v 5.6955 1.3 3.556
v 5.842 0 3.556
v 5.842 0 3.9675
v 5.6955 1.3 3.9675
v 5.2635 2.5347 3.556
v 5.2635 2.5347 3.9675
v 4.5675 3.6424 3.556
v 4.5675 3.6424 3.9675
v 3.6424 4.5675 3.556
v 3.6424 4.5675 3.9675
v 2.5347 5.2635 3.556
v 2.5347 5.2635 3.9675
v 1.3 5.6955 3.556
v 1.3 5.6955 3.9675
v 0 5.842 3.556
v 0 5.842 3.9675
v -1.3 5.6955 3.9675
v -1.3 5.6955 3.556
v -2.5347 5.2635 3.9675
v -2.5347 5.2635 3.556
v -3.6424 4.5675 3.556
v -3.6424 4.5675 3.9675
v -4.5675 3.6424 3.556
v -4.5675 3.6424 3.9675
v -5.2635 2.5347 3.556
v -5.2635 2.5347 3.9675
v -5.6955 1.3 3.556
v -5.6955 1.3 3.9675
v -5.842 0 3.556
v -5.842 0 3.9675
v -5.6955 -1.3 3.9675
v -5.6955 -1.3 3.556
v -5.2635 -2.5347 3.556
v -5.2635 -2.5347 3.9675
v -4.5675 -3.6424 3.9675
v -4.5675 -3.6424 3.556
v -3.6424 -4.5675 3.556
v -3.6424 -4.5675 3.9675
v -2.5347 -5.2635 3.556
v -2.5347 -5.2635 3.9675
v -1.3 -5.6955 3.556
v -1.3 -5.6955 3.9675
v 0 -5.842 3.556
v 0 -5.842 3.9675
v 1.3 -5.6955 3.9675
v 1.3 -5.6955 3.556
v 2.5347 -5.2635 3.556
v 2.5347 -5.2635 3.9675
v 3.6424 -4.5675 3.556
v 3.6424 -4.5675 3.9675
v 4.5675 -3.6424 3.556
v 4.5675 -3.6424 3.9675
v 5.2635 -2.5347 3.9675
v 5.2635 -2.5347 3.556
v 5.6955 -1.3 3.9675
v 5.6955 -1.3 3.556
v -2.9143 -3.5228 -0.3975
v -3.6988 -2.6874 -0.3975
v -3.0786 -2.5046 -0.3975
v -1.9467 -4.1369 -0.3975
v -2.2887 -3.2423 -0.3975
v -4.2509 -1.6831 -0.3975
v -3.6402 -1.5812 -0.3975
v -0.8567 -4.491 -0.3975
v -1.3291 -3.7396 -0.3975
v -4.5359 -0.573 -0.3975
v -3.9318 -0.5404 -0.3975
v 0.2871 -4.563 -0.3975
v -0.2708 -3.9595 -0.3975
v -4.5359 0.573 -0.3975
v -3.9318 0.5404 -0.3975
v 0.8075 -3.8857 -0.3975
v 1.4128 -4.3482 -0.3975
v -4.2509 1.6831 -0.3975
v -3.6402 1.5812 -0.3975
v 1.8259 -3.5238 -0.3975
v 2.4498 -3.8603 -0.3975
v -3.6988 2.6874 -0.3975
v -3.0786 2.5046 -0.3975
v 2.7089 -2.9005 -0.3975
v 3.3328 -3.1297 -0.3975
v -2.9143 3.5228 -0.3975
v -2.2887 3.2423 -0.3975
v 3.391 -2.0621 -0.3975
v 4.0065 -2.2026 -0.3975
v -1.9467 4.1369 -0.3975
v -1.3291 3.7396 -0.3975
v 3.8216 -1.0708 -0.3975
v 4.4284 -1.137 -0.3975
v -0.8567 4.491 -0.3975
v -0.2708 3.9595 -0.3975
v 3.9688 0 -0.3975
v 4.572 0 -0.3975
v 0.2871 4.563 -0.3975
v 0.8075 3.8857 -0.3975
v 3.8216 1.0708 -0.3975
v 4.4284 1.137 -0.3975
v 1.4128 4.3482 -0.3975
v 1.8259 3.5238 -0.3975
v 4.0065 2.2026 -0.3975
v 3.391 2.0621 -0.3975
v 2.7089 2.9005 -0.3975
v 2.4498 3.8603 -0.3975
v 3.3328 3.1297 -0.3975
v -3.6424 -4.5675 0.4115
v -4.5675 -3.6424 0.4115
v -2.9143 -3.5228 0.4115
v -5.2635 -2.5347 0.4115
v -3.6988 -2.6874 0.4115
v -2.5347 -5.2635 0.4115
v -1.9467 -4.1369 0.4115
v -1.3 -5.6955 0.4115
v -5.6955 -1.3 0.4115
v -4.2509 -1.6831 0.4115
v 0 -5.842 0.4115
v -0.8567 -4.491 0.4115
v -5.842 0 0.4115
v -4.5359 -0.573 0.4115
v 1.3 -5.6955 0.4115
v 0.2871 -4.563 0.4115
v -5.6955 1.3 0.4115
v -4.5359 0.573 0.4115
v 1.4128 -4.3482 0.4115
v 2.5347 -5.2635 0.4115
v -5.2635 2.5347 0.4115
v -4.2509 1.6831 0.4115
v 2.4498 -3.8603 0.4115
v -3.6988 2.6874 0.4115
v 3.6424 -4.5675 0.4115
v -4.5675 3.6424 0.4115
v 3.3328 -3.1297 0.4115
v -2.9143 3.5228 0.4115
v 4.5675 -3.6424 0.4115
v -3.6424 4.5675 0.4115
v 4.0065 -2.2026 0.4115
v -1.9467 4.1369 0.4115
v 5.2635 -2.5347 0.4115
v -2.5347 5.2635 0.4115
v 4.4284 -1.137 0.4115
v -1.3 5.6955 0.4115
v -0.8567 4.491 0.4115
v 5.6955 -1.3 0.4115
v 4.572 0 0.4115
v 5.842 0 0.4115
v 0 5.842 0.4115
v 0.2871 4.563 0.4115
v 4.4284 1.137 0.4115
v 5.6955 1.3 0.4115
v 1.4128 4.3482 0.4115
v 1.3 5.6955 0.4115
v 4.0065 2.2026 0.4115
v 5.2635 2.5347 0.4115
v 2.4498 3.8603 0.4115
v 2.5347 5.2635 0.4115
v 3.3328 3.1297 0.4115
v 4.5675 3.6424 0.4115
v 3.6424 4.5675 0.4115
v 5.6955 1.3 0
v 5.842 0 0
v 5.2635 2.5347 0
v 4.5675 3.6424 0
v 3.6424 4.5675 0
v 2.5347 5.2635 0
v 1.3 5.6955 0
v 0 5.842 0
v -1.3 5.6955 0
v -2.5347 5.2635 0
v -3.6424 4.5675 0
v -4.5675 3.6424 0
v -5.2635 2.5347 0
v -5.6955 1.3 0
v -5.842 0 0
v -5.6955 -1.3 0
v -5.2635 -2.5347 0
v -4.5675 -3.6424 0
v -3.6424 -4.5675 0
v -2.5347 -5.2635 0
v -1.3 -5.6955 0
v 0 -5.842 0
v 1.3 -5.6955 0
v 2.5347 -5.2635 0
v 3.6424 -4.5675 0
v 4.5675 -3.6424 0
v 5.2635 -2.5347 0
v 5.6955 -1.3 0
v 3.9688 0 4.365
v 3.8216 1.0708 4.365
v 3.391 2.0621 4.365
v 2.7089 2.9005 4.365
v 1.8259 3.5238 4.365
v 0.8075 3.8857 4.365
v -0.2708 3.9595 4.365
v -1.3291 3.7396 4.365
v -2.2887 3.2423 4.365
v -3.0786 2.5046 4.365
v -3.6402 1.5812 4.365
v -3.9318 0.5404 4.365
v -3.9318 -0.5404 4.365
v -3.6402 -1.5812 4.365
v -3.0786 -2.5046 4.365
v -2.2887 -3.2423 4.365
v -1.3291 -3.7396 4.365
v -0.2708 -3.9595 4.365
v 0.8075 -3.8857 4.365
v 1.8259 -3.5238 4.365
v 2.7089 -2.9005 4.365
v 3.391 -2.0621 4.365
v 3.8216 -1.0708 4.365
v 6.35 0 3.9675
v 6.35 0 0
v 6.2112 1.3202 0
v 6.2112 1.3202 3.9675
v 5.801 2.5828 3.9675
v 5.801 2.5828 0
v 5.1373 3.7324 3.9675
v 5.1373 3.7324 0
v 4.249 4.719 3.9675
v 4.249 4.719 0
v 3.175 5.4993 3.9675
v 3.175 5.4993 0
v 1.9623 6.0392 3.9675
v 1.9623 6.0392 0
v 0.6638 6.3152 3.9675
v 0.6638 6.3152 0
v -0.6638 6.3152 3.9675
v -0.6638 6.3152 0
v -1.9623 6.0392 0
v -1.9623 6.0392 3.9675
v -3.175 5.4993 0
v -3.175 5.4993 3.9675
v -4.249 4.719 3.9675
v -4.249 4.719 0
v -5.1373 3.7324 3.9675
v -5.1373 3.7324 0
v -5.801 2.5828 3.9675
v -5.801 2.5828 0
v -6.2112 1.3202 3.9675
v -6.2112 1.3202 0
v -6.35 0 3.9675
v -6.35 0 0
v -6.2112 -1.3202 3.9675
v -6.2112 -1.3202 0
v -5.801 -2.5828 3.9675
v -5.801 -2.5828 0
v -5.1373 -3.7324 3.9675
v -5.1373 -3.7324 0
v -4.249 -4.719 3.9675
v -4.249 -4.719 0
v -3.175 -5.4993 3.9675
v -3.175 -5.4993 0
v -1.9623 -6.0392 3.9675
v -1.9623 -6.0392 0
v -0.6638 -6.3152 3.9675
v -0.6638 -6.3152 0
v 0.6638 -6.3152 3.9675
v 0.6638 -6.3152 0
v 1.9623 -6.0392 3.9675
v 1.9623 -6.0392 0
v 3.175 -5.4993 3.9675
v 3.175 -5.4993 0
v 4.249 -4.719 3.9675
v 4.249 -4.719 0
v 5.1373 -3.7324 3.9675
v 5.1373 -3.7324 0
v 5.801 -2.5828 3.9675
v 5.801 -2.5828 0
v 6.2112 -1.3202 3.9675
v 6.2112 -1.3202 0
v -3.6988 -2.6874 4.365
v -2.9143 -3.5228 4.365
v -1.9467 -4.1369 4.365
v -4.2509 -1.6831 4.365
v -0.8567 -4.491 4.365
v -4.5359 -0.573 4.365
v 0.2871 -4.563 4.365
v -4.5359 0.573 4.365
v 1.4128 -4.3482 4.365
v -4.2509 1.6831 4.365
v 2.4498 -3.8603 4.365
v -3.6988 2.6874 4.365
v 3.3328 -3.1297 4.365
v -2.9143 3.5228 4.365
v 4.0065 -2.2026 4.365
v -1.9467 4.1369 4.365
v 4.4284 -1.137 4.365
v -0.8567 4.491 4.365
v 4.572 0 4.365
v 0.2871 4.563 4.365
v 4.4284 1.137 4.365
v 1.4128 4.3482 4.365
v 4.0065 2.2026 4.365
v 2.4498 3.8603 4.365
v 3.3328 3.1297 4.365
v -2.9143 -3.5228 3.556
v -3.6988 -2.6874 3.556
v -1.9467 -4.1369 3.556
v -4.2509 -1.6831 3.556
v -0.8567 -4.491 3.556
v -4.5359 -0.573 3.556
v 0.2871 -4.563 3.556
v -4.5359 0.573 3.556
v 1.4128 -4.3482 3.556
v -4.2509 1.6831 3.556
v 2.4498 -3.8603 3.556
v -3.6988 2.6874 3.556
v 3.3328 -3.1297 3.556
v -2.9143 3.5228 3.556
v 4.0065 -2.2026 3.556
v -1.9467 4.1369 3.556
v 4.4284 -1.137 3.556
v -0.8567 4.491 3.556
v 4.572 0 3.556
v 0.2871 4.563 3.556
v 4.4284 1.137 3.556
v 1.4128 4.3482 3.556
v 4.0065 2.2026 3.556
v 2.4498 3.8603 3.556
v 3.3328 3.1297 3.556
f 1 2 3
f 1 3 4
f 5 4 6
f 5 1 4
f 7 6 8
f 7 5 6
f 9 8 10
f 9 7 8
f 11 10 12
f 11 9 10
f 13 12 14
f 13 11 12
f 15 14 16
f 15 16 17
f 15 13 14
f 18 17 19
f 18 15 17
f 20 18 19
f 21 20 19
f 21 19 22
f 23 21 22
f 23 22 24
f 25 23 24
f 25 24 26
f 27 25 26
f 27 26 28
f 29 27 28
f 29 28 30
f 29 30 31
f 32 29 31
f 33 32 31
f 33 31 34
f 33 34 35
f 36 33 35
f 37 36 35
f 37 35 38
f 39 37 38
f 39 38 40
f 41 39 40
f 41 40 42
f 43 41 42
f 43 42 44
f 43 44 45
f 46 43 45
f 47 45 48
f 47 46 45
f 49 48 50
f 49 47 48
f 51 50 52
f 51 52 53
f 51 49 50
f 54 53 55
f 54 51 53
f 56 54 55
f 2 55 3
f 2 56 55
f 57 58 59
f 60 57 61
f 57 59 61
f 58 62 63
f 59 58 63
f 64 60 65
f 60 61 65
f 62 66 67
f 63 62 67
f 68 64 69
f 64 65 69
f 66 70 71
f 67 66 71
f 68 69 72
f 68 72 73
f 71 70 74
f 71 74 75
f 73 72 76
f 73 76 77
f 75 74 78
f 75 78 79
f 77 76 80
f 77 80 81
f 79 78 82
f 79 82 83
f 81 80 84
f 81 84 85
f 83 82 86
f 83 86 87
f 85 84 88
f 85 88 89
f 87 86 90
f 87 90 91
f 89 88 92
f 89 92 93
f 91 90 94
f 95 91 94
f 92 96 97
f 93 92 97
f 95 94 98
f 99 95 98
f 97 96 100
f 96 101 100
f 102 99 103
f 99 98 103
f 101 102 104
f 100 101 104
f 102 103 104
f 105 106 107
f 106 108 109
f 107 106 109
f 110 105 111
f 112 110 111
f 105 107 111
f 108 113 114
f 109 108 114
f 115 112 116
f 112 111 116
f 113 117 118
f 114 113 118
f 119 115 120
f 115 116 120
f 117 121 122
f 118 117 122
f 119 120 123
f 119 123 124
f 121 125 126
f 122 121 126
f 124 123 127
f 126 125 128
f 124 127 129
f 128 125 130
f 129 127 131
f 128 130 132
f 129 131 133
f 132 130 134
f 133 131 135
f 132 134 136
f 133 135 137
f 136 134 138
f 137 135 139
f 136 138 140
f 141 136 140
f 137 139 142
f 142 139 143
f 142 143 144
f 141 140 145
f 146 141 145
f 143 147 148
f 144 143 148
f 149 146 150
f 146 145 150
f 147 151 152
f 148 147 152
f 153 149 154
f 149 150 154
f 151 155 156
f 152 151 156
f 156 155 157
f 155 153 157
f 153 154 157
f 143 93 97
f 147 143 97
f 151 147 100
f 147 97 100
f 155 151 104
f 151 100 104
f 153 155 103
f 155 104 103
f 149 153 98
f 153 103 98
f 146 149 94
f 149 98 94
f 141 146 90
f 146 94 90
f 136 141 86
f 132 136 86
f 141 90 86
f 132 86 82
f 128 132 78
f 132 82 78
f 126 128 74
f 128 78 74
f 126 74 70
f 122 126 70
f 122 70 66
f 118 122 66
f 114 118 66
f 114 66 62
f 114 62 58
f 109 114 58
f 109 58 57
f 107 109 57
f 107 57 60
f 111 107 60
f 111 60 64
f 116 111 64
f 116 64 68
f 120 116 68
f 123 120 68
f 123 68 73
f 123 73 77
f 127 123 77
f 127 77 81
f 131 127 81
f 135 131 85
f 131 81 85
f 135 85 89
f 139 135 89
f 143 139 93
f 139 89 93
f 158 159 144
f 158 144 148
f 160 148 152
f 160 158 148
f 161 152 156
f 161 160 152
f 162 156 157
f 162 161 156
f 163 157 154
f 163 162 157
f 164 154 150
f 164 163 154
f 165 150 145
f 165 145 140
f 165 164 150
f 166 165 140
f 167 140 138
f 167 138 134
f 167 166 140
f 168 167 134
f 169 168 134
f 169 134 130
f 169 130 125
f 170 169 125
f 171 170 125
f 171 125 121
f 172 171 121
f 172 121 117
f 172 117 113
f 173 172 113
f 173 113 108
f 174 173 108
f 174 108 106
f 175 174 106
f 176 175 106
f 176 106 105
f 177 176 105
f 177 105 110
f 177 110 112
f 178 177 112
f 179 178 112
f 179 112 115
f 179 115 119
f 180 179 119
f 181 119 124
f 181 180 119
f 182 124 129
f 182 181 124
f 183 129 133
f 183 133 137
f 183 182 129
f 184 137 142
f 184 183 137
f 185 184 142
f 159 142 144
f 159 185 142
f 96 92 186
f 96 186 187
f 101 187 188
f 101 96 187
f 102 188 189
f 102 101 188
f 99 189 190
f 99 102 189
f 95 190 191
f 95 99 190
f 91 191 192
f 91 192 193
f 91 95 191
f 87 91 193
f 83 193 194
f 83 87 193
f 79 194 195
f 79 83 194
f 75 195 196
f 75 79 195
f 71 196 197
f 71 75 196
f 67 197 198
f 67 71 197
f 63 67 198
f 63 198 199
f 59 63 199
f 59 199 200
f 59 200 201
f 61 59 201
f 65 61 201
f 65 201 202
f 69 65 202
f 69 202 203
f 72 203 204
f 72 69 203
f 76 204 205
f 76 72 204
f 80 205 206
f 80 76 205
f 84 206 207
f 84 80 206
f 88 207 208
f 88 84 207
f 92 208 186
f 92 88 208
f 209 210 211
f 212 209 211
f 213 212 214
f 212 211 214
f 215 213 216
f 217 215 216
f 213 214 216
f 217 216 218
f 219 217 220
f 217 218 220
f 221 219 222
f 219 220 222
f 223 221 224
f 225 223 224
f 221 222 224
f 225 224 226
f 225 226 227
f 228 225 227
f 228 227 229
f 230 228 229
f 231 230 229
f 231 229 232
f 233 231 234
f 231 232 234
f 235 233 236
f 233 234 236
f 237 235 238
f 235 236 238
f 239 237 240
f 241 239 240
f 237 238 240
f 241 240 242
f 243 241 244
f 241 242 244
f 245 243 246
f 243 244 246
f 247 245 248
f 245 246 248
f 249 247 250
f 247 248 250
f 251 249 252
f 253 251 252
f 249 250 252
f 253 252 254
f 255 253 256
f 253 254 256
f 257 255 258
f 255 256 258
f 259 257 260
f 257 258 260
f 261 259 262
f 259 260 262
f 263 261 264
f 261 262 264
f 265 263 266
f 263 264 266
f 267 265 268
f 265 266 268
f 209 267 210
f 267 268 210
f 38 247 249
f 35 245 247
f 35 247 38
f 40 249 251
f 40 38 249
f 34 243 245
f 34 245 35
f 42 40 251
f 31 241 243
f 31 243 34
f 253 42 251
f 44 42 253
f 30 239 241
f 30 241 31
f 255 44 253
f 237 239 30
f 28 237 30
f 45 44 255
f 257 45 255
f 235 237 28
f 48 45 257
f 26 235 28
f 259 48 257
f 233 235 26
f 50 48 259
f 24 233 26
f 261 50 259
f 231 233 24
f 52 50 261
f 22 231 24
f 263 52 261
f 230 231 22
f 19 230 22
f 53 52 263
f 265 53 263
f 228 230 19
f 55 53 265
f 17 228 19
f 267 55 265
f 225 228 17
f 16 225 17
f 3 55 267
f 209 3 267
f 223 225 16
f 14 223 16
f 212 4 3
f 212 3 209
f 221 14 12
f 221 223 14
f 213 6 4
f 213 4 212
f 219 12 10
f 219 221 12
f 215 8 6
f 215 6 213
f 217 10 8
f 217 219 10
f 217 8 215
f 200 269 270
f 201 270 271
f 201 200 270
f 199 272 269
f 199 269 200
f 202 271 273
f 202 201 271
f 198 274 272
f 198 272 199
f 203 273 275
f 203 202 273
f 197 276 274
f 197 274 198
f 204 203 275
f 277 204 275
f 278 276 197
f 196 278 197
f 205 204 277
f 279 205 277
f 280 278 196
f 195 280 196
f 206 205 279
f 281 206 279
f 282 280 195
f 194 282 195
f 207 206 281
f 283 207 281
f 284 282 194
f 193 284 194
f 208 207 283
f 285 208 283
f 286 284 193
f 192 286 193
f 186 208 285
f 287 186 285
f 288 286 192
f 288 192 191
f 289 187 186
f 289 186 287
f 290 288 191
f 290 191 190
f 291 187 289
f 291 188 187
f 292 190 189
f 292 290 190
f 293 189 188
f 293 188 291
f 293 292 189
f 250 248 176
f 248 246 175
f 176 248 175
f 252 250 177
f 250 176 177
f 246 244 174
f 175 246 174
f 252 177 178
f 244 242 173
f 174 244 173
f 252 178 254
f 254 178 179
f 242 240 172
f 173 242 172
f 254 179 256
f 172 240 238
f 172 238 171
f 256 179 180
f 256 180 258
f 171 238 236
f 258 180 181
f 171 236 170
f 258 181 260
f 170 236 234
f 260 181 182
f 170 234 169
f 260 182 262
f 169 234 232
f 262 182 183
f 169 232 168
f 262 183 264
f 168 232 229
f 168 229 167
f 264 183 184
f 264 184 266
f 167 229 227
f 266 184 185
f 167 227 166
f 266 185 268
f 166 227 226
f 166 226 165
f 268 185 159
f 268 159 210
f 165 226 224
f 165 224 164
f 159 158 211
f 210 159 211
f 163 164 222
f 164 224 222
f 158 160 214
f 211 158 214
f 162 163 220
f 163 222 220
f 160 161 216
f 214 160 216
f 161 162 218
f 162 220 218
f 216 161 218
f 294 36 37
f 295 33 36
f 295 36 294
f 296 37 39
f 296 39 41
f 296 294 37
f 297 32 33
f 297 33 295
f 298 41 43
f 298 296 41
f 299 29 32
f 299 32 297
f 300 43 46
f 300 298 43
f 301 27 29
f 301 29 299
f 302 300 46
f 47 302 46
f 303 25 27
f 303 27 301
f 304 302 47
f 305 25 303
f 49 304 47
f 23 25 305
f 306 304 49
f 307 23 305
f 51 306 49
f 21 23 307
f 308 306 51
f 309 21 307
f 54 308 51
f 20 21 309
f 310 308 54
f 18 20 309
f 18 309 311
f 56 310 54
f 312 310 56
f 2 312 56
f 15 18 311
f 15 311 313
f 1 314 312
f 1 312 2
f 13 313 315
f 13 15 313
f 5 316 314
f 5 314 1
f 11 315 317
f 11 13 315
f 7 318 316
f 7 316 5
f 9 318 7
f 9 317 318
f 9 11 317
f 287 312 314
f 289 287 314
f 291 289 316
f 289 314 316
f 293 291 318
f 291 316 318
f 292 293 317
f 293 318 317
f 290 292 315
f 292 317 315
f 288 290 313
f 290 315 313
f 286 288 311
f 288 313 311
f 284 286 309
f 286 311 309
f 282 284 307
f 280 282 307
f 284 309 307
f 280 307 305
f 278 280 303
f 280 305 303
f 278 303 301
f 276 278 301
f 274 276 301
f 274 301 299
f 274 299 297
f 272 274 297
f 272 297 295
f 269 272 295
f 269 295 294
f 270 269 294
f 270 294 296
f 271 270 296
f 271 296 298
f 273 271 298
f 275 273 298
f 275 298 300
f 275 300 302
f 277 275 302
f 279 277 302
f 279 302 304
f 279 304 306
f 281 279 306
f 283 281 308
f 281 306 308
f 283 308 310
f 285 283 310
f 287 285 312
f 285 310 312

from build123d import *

# Parameters (mm, degrees)
SKETCH1_R                = 6.35
SKETCH1_R_2              = 5.842
BOSS_EXTRUDE1_DEPTH      = 3.96748
BOSS_EXTRUDE2_DEPTH      = 4.36499
BOSS_EXTRUDE2_DEPTH_BACK = 0.39751
SKETCH1_3_R              = 4.572
SKETCH1_3_R_2            = 3.96875
BOSS_EXTRUDE3_START      = 0.41148
SKETCH1_4_R              = 5.842
SKETCH1_4_R_2            = 4.572
BOSS_EXTRUDE3_DEPTH      = 3.14452


with BuildPart() as part:
    # Sketch1 → Boss-Extrude1 (new body)
    with BuildSketch(Plane.XY):
        Circle(SKETCH1_R)
        Circle(SKETCH1_R_2, mode=Mode.SUBTRACT)
    extrude(amount=BOSS_EXTRUDE1_DEPTH)



with BuildPart() as body_2:
    # Sketch1<3> → Boss-Extrude2 (new, two sides: drawn at the far end of the back side and taken through both)
    with BuildSketch(Plane.XY.offset(-BOSS_EXTRUDE2_DEPTH_BACK)):
        Circle(SKETCH1_3_R)
        Circle(SKETCH1_3_R_2, mode=Mode.SUBTRACT)
    extrude(amount=BOSS_EXTRUDE2_DEPTH + BOSS_EXTRUDE2_DEPTH_BACK)


with BuildPart() as part_1:
    add(part.part)

    add(body_2.part)  # Boss-Extrude3 merges body 2
    # Sketch1<4> → Boss-Extrude3 (add)
    with BuildSketch(Plane.XY.offset(BOSS_EXTRUDE3_START)):
        Circle(SKETCH1_4_R)
        Circle(SKETCH1_4_R_2, mode=Mode.SUBTRACT)
    extrude(amount=BOSS_EXTRUDE3_DEPTH)


solid = part_1.part
